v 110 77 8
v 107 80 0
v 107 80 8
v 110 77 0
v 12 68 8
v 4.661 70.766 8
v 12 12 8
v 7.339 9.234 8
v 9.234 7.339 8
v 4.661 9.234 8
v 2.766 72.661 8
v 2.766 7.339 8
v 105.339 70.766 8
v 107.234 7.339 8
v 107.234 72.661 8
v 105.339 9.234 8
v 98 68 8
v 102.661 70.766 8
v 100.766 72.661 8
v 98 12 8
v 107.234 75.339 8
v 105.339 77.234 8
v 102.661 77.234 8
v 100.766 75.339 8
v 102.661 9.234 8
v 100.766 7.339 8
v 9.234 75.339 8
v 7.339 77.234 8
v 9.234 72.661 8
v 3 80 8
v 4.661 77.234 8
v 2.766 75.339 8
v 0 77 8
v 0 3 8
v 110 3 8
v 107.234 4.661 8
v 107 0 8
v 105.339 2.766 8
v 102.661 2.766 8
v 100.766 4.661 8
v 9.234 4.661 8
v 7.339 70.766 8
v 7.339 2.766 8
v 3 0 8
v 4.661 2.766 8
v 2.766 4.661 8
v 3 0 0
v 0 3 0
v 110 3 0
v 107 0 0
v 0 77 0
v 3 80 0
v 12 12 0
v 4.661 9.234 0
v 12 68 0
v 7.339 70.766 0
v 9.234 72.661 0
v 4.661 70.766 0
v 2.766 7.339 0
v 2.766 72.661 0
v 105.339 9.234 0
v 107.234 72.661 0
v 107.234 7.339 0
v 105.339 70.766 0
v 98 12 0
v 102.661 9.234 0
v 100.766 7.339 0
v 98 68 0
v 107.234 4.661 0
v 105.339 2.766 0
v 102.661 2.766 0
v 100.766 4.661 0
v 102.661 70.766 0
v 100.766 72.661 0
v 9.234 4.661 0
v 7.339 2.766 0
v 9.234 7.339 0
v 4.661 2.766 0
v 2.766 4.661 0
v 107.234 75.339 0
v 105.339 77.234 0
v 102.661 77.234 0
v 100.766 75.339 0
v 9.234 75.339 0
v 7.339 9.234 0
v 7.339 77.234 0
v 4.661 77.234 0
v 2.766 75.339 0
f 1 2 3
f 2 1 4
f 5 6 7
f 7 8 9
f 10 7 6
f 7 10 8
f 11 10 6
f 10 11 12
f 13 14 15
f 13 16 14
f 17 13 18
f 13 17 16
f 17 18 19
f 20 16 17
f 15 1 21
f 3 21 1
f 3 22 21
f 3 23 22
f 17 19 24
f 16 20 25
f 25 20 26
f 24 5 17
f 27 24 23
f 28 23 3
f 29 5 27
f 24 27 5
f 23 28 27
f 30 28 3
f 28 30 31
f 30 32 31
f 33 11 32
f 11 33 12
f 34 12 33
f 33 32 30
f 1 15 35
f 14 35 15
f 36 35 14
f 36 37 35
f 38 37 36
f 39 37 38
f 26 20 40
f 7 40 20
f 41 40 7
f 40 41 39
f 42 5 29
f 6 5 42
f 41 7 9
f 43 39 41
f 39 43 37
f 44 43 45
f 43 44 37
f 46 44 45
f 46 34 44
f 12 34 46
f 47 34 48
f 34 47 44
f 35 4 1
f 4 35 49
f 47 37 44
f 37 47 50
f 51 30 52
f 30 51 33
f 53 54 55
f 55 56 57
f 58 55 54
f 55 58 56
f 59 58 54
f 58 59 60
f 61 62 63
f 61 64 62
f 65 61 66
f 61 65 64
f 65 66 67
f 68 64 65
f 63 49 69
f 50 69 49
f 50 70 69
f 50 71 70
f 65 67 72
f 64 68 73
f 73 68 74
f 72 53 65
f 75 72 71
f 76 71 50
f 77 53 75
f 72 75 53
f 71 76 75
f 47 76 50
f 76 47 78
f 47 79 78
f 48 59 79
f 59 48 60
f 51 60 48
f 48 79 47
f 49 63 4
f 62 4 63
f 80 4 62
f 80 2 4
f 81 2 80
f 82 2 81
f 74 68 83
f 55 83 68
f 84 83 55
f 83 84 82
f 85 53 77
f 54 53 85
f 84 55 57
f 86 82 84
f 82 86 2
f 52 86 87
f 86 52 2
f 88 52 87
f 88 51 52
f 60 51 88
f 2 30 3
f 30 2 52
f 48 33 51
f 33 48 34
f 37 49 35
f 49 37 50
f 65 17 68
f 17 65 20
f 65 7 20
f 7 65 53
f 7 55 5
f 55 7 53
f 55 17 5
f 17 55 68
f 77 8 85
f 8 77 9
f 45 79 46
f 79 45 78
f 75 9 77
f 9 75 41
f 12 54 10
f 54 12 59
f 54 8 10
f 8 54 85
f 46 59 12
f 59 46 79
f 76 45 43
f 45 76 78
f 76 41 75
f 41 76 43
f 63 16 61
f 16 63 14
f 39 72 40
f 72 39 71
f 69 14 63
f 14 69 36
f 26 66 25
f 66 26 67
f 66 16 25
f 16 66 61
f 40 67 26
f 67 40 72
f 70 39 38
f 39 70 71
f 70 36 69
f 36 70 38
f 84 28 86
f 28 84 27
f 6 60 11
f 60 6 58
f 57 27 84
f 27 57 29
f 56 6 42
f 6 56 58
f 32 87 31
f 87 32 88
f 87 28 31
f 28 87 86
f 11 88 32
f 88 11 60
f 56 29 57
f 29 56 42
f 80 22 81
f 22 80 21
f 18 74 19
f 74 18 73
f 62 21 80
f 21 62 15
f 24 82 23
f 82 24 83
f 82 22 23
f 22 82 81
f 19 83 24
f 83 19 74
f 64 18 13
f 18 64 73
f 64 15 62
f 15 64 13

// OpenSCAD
$fn = 32;

// ----------------------------------------------------------------------
// Frame plate: 110 x 80 frame, 12 mm rails
// ----------------------------------------------------------------------

// --- parameters (mm) ---
plate_l = 110;            // plate length, X
plate_w = 80;             // plate width, Y
plate_t = 8;              // plate thickness, Z (extrusion height)
corner_c = 3;             // corner chamfer
frame_bar = 12;           // frame rail width
bolt_r = 3.5;             // corner bolt window radius
bolt_inset = 6;           // bolt centre inset from the edges

win_l = plate_l - 2 * frame_bar;  // window length
win_w = plate_w - 2 * frame_bar;  // window width
bolt_d = 2 * bolt_r;  // corner hole diameter

profile = [[3, 0], [107, 0], [110, 3], [110, 77], [107, 80], [3, 80], [0, 77], [0, 3]];  // primary outline, 8 points, counter clockwise
void_1 = [[12, 12], [98, 12], [98, 68], [12, 68]];  // the window, 4 points
void_2 = [[9.234, 7.339], [7.339, 9.234], [4.661, 9.234], [2.766, 7.339], [2.766, 4.661], [4.661, 2.766], [7.339, 2.766], [9.234, 4.661]];  // corner bolt window, 8 points
void_3 = [[107.234, 7.339], [105.339, 9.234], [102.661, 9.234], [100.766, 7.339], [100.766, 4.661], [102.661, 2.766], [105.339, 2.766], [107.234, 4.661]];  // corner bolt window, 8 points
void_4 = [[9.234, 75.339], [7.339, 77.234], [4.661, 77.234], [2.766, 75.339], [2.766, 72.661], [4.661, 70.766], [7.339, 70.766], [9.234, 72.661]];  // corner bolt window, 8 points
void_5 = [[107.234, 75.339], [105.339, 77.234], [102.661, 77.234], [100.766, 75.339], [100.766, 72.661], [102.661, 70.766], [105.339, 70.766], [107.234, 72.661]];  // corner bolt window, 8 points

// --- the one profile operation ---
difference() {
  linear_extrude(height = plate_t) polygon(points = profile);
  translate([0, 0, -1])
    linear_extrude(height = plate_t + 2) polygon(points = void_1);
  translate([0, 0, -1])
    linear_extrude(height = plate_t + 2) polygon(points = void_2);
  translate([0, 0, -1])
    linear_extrude(height = plate_t + 2) polygon(points = void_3);
  translate([0, 0, -1])
    linear_extrude(height = plate_t + 2) polygon(points = void_4);
  translate([0, 0, -1])
    linear_extrude(height = plate_t + 2) polygon(points = void_5);
}
